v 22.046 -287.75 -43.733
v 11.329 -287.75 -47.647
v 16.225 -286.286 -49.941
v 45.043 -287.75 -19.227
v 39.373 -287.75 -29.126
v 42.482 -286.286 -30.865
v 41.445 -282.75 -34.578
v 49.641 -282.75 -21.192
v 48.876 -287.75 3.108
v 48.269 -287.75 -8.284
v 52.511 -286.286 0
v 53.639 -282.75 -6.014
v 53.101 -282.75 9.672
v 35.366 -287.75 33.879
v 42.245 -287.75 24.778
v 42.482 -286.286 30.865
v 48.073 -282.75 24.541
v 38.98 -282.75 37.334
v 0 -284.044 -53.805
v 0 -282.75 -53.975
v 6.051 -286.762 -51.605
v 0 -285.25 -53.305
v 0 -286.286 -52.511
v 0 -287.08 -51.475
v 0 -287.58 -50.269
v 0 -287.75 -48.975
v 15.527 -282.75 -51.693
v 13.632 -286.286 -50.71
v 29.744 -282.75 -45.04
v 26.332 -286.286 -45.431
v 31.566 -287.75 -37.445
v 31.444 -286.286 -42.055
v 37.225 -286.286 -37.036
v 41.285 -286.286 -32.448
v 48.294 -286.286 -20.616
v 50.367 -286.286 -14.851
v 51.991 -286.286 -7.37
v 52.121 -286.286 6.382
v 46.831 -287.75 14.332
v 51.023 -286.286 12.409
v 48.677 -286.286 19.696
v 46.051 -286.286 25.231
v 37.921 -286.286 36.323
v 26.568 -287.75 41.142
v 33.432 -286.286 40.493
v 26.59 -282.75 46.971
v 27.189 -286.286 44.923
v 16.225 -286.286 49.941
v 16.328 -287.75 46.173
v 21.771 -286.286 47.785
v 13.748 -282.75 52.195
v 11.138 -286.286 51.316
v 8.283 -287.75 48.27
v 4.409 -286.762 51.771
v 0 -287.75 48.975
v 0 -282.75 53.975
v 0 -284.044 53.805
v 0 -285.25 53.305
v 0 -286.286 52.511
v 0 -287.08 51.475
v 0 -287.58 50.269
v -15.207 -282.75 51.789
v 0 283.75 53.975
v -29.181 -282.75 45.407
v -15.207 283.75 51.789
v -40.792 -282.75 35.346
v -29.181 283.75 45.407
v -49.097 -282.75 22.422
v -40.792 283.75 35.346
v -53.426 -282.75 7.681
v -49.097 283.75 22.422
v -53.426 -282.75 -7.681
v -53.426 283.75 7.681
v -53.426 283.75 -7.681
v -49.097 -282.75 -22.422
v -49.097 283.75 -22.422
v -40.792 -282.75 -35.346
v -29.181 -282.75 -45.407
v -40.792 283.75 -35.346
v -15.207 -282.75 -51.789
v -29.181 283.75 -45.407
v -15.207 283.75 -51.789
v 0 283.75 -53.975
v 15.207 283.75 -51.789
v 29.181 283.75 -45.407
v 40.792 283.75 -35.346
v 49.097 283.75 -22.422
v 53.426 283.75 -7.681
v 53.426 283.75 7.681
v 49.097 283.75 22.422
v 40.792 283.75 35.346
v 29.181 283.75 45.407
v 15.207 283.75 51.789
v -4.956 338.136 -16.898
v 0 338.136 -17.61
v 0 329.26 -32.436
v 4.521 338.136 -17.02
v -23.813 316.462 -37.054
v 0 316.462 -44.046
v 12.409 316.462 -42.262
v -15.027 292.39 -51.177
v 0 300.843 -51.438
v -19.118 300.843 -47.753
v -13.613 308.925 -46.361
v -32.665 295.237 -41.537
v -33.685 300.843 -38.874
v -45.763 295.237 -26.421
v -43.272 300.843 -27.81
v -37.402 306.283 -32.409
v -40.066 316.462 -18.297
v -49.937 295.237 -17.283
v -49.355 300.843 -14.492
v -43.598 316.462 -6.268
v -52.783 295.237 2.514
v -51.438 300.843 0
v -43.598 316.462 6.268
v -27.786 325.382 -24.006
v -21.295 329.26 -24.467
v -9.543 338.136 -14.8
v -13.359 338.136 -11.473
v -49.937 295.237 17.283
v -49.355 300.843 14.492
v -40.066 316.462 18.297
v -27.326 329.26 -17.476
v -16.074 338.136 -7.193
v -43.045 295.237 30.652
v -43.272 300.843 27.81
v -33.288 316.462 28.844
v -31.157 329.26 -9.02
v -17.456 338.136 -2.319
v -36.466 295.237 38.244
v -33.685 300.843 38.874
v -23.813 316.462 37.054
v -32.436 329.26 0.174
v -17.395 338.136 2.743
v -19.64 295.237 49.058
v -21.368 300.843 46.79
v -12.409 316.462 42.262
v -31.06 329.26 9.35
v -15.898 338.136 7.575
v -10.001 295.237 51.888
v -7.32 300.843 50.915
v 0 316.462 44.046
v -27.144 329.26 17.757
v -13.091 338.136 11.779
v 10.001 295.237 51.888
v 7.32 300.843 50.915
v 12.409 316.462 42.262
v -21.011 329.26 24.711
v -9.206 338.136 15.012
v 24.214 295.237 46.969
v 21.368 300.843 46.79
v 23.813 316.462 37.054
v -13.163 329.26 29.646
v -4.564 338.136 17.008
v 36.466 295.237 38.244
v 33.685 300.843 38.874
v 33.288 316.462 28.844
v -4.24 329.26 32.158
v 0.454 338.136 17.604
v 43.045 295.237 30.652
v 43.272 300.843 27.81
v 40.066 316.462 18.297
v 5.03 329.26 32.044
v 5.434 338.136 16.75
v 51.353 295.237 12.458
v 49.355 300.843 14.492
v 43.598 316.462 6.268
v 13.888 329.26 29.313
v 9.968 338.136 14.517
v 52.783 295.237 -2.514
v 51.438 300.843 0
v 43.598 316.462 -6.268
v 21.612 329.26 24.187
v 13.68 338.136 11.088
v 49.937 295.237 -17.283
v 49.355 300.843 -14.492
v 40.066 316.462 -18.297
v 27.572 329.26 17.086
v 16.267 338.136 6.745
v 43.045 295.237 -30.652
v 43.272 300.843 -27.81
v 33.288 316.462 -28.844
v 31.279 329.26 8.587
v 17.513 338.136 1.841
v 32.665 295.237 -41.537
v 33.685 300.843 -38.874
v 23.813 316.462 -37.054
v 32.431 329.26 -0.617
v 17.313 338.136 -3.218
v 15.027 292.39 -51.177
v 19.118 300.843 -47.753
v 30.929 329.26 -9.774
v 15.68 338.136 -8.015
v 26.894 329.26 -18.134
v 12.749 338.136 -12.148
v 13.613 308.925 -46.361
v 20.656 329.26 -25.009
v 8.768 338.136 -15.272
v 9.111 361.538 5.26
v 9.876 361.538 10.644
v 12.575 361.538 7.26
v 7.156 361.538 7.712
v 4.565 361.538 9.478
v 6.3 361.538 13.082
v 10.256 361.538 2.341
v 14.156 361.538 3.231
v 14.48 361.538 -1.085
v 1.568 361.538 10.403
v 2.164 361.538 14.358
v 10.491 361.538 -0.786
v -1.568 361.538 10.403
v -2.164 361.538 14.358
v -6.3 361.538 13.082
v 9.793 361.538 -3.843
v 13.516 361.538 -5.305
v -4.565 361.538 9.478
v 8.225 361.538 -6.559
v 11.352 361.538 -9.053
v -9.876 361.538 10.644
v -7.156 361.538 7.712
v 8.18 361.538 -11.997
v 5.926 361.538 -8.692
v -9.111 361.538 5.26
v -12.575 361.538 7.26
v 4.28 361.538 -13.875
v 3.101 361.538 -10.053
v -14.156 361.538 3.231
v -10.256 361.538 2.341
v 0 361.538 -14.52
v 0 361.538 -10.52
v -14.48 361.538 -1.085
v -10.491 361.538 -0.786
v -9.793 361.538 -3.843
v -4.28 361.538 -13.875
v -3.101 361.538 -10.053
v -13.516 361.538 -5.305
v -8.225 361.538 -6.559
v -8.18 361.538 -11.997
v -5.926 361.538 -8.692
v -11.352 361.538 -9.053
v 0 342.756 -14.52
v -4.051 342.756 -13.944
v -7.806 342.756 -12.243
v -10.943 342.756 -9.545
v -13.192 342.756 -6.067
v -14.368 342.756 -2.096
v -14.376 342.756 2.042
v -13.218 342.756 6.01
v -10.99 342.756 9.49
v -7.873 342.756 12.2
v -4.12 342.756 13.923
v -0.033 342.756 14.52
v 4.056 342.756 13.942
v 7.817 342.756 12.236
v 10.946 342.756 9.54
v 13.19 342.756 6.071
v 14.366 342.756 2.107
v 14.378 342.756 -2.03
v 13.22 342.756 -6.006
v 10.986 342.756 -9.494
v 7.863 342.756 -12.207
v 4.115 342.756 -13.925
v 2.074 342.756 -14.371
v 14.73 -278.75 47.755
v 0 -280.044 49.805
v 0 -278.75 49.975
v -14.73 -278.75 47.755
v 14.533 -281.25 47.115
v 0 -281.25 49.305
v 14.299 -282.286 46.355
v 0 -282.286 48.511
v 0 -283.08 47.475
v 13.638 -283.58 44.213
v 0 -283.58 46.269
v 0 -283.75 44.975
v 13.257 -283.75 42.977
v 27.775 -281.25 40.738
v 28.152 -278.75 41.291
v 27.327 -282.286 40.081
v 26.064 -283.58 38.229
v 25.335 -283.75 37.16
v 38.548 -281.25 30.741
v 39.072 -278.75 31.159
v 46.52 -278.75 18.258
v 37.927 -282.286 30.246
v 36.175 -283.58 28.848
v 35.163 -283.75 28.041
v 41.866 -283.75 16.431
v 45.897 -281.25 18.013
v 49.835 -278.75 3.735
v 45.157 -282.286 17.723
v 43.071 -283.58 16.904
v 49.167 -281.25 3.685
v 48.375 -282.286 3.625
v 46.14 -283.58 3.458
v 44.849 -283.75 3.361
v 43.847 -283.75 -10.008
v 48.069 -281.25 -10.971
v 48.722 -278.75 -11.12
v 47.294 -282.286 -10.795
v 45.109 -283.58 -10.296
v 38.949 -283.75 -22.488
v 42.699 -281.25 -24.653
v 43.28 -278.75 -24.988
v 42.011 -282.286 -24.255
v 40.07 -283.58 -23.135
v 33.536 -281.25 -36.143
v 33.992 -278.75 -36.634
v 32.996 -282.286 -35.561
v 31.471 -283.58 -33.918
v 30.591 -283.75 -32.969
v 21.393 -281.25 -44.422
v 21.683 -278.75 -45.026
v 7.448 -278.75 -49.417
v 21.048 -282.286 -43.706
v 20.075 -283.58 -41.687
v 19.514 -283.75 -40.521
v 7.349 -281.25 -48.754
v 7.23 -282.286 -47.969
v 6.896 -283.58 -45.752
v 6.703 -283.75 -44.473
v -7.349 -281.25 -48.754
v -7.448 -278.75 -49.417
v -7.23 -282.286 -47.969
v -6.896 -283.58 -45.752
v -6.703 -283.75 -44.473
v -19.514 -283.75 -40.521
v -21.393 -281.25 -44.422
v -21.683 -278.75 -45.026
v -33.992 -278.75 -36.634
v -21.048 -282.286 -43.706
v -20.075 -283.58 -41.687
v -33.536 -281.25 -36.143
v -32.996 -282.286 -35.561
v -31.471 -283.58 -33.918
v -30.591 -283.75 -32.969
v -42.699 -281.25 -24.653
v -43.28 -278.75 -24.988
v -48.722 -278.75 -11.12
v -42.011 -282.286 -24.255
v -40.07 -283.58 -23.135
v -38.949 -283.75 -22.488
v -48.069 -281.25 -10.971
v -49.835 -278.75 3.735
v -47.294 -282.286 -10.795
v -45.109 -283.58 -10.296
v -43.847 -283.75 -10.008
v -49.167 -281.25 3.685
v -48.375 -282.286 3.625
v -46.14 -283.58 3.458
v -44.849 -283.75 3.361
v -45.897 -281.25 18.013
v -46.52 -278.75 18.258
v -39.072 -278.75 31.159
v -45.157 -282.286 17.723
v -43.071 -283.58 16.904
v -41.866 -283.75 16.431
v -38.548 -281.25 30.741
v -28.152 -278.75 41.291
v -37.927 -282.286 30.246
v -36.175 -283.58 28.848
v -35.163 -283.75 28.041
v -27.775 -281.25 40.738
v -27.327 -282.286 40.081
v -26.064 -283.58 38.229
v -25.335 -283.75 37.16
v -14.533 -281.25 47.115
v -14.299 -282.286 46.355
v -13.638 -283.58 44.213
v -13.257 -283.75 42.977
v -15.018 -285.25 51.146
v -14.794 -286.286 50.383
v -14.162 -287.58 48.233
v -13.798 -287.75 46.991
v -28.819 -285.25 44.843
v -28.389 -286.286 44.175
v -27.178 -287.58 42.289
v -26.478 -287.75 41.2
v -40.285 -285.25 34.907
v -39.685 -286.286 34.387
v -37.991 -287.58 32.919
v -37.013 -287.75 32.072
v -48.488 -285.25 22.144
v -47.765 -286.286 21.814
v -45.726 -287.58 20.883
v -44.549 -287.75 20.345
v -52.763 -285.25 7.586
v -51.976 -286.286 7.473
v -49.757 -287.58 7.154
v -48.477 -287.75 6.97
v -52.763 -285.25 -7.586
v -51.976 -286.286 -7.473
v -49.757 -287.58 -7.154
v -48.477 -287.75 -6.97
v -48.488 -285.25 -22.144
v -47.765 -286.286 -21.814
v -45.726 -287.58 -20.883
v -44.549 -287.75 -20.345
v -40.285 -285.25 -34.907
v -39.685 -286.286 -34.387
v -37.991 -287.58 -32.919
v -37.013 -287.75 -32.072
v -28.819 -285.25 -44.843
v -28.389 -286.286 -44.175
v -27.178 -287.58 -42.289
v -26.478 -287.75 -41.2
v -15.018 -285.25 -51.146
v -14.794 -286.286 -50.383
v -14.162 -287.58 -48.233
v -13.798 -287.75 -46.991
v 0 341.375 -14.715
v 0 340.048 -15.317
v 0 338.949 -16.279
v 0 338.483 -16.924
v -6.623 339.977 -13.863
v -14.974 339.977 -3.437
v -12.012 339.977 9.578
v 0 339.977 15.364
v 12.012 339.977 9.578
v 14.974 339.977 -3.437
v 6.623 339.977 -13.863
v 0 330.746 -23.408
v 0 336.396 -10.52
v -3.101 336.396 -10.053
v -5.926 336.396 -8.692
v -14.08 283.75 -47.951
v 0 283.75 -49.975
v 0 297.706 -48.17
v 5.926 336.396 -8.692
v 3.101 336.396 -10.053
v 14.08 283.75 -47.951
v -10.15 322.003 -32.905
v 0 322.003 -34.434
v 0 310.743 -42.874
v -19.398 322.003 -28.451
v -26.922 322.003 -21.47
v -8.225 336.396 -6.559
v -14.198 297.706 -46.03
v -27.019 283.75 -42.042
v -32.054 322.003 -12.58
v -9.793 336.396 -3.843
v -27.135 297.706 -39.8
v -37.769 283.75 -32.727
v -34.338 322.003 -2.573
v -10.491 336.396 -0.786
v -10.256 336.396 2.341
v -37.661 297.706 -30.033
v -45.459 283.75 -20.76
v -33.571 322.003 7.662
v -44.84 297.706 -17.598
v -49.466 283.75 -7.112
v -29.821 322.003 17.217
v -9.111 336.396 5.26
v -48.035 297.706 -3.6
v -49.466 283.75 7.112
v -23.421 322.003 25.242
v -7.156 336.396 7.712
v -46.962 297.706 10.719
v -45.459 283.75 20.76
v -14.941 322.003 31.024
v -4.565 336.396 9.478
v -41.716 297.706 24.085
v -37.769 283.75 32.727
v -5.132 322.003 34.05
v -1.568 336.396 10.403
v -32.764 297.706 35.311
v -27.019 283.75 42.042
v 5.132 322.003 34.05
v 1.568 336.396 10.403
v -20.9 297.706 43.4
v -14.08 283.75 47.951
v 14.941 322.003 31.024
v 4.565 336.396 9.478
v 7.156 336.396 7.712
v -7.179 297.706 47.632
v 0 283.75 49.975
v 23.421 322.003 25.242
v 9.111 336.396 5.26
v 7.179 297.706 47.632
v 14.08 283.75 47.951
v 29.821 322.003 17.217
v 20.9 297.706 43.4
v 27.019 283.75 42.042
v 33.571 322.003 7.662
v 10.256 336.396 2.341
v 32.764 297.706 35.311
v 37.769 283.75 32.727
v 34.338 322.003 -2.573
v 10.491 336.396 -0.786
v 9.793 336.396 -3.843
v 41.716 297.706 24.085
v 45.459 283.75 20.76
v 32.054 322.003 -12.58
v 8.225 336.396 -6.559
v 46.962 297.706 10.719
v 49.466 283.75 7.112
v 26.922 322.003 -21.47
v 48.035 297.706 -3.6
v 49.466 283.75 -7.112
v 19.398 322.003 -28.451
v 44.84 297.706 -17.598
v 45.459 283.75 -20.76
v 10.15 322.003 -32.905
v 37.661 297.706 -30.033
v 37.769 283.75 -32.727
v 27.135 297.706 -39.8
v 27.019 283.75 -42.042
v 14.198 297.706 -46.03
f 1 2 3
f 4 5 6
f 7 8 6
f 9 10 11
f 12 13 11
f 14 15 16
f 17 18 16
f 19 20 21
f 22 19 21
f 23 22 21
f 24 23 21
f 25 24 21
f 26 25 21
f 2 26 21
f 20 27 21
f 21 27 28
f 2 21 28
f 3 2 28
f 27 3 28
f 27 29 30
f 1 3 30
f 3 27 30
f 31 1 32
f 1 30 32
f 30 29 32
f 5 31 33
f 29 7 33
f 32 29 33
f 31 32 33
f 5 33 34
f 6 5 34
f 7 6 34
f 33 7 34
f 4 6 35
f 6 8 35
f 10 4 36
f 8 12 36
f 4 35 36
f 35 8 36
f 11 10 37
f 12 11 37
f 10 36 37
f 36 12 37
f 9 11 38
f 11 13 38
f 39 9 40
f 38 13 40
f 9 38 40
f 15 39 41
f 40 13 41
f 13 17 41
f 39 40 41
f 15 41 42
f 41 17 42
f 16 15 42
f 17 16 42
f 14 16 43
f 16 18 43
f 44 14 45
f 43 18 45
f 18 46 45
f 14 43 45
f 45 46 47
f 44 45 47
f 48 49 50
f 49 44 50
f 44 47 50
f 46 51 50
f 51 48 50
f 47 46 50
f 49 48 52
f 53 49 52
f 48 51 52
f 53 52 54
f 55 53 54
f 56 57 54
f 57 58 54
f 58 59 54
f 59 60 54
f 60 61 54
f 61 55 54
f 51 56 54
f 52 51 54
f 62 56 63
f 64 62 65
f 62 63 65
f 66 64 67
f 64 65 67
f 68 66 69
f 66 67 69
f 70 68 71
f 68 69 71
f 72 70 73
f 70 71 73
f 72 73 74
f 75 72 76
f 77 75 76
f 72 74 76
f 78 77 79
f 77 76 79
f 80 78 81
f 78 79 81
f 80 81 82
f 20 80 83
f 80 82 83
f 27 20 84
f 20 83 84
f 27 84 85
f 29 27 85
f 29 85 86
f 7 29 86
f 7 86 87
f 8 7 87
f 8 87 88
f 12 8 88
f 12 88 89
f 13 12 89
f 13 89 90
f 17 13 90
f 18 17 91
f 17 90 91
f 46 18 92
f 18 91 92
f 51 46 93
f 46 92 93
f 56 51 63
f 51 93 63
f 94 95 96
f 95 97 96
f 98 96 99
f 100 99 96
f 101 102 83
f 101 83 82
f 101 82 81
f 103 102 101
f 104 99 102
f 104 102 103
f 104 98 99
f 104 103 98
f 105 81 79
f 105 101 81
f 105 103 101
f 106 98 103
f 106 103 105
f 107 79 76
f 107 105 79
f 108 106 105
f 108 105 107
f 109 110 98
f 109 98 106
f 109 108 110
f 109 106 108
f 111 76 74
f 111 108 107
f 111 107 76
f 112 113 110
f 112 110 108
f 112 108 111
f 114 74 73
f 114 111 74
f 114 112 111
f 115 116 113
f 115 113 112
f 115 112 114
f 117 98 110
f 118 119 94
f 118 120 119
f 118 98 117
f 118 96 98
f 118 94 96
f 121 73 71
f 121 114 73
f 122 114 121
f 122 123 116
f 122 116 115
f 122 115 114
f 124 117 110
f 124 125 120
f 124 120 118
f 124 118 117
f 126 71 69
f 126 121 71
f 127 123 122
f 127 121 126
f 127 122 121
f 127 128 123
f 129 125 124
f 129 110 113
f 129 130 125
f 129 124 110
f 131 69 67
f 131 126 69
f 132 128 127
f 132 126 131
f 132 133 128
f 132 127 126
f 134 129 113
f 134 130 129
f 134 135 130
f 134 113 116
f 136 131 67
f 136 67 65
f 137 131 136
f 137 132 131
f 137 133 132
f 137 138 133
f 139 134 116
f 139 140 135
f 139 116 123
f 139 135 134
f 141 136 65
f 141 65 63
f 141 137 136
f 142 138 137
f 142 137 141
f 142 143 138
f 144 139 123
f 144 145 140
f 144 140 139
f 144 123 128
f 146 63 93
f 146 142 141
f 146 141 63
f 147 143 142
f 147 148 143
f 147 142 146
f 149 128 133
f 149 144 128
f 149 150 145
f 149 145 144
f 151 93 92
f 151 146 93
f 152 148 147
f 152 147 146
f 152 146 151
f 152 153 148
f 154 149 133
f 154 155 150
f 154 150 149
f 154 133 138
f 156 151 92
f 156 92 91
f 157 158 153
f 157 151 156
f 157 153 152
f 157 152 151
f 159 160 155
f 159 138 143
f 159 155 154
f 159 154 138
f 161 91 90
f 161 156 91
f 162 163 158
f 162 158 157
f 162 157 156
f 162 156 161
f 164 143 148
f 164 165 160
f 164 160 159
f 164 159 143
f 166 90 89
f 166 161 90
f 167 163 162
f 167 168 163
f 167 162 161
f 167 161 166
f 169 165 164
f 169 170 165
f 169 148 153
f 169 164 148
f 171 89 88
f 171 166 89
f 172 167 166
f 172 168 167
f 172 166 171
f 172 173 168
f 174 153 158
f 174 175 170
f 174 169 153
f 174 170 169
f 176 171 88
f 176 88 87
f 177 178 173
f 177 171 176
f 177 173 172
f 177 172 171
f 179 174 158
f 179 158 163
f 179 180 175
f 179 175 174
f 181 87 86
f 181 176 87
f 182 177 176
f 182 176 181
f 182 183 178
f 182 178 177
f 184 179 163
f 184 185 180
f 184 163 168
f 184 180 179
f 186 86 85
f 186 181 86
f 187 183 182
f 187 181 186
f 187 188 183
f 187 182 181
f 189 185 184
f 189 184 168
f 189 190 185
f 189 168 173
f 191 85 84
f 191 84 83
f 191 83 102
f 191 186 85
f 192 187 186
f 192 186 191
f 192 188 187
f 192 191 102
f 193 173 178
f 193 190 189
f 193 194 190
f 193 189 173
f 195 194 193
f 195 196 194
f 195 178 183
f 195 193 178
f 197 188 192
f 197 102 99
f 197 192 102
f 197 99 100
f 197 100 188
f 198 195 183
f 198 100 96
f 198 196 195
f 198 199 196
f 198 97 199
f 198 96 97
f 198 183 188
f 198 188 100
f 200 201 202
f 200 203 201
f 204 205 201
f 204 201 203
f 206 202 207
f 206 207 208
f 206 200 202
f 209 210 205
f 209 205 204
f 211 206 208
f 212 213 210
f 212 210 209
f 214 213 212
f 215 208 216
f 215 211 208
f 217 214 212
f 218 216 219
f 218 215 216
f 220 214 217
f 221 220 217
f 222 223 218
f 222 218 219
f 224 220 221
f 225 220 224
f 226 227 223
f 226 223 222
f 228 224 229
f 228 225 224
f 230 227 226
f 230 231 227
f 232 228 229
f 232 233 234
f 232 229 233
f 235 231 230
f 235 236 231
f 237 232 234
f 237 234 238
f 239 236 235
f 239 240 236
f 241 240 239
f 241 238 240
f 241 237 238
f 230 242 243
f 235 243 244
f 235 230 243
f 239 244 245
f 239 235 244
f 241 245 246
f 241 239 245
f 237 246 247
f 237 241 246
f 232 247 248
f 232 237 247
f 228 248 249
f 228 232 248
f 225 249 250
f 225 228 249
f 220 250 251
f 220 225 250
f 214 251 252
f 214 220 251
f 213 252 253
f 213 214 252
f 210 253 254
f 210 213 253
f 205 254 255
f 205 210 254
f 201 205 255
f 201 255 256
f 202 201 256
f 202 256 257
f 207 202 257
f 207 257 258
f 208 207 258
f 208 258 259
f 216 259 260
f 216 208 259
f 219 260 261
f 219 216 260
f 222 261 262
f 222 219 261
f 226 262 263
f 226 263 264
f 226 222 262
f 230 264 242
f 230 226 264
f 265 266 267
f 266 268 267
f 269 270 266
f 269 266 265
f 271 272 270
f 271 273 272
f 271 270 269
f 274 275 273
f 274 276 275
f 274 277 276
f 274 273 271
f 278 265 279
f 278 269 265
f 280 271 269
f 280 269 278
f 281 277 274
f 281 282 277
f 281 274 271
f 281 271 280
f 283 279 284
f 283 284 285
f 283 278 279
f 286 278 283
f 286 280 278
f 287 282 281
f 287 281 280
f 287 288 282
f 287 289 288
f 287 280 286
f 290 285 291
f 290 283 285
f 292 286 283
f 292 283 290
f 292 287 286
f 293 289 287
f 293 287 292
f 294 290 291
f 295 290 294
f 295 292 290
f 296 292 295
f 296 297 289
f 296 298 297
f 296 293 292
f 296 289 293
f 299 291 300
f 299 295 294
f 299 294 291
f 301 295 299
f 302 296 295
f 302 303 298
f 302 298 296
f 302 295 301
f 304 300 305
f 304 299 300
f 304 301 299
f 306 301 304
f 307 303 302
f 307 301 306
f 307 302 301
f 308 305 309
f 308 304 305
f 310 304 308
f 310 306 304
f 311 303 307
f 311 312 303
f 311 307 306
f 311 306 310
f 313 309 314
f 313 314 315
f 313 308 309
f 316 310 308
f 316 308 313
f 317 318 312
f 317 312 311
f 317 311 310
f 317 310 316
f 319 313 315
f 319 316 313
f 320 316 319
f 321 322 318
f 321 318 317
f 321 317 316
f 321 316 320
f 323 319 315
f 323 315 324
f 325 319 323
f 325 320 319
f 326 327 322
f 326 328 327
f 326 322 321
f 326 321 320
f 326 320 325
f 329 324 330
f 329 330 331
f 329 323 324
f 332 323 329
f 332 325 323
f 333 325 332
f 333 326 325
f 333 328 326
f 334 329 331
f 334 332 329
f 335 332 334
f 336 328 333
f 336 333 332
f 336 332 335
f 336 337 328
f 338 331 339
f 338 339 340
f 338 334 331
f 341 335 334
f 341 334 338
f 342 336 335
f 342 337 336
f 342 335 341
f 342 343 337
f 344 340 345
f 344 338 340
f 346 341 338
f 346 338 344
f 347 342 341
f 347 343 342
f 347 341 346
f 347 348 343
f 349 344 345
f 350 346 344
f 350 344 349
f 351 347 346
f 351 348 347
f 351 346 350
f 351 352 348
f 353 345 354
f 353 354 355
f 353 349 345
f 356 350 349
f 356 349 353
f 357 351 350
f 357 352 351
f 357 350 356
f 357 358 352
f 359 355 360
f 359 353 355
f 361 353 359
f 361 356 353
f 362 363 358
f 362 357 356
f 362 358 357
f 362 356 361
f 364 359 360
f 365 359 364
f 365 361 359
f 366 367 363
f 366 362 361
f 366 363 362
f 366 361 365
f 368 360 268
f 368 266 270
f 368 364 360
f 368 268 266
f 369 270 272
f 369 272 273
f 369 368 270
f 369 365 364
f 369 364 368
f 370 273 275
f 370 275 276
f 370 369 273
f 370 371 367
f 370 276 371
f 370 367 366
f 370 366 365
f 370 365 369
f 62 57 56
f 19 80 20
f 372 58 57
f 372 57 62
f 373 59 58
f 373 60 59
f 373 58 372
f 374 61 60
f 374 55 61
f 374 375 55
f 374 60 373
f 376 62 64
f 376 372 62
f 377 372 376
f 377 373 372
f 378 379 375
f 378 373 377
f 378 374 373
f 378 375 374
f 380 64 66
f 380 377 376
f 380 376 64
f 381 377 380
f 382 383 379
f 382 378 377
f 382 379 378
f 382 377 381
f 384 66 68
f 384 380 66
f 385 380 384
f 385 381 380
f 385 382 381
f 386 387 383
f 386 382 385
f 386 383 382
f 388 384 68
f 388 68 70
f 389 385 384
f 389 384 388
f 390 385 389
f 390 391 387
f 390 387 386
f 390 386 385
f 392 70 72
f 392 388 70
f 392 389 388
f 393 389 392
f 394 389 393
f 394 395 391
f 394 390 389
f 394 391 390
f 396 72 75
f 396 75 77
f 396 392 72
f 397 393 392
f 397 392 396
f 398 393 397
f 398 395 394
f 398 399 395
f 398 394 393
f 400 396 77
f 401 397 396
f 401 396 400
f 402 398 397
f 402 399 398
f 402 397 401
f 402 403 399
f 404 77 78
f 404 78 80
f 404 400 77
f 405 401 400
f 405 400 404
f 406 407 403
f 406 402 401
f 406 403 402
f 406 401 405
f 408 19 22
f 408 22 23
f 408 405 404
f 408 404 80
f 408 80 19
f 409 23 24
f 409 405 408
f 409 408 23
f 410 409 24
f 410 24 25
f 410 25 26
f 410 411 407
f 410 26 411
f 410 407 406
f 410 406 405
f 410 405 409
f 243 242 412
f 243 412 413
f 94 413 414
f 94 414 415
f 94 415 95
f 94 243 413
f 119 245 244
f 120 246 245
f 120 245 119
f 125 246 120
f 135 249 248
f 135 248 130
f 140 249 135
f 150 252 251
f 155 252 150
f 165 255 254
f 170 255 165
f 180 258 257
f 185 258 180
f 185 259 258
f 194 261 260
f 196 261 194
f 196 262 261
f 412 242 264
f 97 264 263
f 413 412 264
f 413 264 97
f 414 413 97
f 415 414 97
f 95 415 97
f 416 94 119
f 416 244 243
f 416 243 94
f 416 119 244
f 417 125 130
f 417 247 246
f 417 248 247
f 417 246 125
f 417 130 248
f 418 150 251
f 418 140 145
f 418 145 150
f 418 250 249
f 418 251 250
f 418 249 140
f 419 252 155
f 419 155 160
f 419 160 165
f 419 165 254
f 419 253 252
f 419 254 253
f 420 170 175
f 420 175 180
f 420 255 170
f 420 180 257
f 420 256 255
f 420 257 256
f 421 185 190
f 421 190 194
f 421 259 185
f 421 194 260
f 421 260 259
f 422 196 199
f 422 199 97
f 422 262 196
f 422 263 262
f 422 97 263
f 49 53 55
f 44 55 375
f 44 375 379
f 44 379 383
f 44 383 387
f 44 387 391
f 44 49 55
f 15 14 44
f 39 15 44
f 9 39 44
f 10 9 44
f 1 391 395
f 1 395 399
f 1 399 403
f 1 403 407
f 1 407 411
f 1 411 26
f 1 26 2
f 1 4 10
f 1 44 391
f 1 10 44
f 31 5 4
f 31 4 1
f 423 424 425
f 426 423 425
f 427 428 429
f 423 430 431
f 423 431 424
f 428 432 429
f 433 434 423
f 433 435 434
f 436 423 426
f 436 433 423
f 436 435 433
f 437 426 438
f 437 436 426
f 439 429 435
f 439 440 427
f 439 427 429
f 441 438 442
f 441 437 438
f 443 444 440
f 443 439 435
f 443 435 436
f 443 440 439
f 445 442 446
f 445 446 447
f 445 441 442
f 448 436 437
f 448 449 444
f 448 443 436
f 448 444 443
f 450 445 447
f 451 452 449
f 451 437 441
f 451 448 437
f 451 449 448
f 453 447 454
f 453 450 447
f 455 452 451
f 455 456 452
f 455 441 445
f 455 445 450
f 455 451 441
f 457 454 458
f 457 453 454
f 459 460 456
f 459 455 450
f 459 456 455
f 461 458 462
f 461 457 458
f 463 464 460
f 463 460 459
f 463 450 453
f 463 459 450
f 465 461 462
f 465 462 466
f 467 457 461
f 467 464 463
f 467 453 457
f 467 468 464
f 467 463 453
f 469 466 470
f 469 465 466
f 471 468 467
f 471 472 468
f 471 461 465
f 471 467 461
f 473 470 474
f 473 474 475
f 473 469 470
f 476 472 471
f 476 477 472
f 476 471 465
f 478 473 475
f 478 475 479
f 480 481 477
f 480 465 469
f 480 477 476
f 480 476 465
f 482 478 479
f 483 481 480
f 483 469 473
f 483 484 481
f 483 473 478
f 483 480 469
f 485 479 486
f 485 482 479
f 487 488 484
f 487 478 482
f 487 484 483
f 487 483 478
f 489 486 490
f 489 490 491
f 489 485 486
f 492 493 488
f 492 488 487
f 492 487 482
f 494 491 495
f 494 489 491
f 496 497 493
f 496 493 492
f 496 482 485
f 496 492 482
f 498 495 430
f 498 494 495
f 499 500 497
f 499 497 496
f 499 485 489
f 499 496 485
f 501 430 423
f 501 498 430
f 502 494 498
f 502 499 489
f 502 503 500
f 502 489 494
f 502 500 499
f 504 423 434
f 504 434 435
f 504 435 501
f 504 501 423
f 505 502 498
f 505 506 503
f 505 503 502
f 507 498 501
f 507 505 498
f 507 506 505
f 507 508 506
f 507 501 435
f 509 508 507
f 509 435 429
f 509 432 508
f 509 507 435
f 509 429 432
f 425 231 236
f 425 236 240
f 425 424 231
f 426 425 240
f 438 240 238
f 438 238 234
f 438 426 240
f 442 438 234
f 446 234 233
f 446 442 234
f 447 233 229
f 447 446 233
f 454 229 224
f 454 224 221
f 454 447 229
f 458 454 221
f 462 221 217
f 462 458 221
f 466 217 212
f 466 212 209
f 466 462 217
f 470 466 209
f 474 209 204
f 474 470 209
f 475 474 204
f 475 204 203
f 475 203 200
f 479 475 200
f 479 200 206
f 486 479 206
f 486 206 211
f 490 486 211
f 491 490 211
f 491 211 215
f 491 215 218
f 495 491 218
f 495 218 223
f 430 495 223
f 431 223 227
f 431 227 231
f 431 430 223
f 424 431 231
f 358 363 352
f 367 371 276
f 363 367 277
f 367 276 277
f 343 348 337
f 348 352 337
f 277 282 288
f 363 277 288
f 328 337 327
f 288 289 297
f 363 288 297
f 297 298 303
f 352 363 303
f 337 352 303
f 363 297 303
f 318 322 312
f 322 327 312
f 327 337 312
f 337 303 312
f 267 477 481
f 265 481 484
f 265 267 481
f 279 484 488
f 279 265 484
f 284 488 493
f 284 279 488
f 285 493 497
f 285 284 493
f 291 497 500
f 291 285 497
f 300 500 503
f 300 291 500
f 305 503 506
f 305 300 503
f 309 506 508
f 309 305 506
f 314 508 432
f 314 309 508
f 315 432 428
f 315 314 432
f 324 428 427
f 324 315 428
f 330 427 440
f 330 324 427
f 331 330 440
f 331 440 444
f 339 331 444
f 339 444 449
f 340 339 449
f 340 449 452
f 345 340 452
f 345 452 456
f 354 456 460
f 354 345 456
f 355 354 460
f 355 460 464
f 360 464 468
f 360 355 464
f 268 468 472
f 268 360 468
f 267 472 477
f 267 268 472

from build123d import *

# Parameters (mm, degrees)
SKETCH1_R           = 53.975
SKETCH1_R_2         = 49.975
BOSS_EXTRUDE1_DEPTH = 283.75
SKETCH2_R           = 53.975
BOSS_EXTRUDE2_DEPTH = 4
FILLET1_R           = 5


with BuildPart() as part:
    # Sketch1 → Boss-Extrude1 (new, symmetric)
    with BuildSketch(Plane(origin=(0, 0, 0), x_dir=(1, 0, 0), z_dir=(0, 1, 0))):
        with Locations(Location((0, 0, 0), (0, 0, 270))):
            Circle(SKETCH1_R)
        with Locations(Location((0, 0, 0), (0, 0, 270))):
            Circle(SKETCH1_R_2, mode=Mode.SUBTRACT)
    extrude(amount=BOSS_EXTRUDE1_DEPTH, both=True)

    # Sketch2 → Boss-Extrude2 (add)
    with BuildSketch(Plane.XZ.offset(283.75)):
        with Locations(Location((0, 0, 0), (0, 0, 270))):
            Circle(SKETCH2_R)
    extrude(amount=BOSS_EXTRUDE2_DEPTH)

    # Sketch3 → Revolve1 (revolve)
    with BuildSketch(Plane.XY, mode=Mode.PRIVATE) as revolve1_sk:
        with BuildLine():
            Line((-14.520190182, 339.3125), (-14.520190182, 361.5375))
            Line((-14.520190182, 361.5375), (-10.520190182, 361.5375))
            Line((-10.520190182, 361.5375), (-10.520190182, 336.395540435))
            ThreePointArc((-10.520190182, 336.395540435), (-39.016633765, 316.644661214), (-49.975, 283.75))
            Line((-49.975, 283.75), (-53.975, 283.75))
            ThreePointArc((-53.975, 283.75), (-43.107974032, 317.822985722), (-14.520190182, 339.3125))
        make_face()
    revolve(revolve1_sk.sketch.rotate(Axis((0, 0, 0), (0, 1, 0)), 270), axis=Axis((0, 0, 0), (0, 1, 0)))

    # Fillet1
    fillet1_edges = [part.edges().sort_by_distance(p)[0] for p in [
        (0, -287.75, 53.975),
        (0, 339.3125, 14.520190182),
        (0, -283.75, -49.975),
    ]]
    fillet(fillet1_edges, radius=FILLET1_R)


solid = part.part
